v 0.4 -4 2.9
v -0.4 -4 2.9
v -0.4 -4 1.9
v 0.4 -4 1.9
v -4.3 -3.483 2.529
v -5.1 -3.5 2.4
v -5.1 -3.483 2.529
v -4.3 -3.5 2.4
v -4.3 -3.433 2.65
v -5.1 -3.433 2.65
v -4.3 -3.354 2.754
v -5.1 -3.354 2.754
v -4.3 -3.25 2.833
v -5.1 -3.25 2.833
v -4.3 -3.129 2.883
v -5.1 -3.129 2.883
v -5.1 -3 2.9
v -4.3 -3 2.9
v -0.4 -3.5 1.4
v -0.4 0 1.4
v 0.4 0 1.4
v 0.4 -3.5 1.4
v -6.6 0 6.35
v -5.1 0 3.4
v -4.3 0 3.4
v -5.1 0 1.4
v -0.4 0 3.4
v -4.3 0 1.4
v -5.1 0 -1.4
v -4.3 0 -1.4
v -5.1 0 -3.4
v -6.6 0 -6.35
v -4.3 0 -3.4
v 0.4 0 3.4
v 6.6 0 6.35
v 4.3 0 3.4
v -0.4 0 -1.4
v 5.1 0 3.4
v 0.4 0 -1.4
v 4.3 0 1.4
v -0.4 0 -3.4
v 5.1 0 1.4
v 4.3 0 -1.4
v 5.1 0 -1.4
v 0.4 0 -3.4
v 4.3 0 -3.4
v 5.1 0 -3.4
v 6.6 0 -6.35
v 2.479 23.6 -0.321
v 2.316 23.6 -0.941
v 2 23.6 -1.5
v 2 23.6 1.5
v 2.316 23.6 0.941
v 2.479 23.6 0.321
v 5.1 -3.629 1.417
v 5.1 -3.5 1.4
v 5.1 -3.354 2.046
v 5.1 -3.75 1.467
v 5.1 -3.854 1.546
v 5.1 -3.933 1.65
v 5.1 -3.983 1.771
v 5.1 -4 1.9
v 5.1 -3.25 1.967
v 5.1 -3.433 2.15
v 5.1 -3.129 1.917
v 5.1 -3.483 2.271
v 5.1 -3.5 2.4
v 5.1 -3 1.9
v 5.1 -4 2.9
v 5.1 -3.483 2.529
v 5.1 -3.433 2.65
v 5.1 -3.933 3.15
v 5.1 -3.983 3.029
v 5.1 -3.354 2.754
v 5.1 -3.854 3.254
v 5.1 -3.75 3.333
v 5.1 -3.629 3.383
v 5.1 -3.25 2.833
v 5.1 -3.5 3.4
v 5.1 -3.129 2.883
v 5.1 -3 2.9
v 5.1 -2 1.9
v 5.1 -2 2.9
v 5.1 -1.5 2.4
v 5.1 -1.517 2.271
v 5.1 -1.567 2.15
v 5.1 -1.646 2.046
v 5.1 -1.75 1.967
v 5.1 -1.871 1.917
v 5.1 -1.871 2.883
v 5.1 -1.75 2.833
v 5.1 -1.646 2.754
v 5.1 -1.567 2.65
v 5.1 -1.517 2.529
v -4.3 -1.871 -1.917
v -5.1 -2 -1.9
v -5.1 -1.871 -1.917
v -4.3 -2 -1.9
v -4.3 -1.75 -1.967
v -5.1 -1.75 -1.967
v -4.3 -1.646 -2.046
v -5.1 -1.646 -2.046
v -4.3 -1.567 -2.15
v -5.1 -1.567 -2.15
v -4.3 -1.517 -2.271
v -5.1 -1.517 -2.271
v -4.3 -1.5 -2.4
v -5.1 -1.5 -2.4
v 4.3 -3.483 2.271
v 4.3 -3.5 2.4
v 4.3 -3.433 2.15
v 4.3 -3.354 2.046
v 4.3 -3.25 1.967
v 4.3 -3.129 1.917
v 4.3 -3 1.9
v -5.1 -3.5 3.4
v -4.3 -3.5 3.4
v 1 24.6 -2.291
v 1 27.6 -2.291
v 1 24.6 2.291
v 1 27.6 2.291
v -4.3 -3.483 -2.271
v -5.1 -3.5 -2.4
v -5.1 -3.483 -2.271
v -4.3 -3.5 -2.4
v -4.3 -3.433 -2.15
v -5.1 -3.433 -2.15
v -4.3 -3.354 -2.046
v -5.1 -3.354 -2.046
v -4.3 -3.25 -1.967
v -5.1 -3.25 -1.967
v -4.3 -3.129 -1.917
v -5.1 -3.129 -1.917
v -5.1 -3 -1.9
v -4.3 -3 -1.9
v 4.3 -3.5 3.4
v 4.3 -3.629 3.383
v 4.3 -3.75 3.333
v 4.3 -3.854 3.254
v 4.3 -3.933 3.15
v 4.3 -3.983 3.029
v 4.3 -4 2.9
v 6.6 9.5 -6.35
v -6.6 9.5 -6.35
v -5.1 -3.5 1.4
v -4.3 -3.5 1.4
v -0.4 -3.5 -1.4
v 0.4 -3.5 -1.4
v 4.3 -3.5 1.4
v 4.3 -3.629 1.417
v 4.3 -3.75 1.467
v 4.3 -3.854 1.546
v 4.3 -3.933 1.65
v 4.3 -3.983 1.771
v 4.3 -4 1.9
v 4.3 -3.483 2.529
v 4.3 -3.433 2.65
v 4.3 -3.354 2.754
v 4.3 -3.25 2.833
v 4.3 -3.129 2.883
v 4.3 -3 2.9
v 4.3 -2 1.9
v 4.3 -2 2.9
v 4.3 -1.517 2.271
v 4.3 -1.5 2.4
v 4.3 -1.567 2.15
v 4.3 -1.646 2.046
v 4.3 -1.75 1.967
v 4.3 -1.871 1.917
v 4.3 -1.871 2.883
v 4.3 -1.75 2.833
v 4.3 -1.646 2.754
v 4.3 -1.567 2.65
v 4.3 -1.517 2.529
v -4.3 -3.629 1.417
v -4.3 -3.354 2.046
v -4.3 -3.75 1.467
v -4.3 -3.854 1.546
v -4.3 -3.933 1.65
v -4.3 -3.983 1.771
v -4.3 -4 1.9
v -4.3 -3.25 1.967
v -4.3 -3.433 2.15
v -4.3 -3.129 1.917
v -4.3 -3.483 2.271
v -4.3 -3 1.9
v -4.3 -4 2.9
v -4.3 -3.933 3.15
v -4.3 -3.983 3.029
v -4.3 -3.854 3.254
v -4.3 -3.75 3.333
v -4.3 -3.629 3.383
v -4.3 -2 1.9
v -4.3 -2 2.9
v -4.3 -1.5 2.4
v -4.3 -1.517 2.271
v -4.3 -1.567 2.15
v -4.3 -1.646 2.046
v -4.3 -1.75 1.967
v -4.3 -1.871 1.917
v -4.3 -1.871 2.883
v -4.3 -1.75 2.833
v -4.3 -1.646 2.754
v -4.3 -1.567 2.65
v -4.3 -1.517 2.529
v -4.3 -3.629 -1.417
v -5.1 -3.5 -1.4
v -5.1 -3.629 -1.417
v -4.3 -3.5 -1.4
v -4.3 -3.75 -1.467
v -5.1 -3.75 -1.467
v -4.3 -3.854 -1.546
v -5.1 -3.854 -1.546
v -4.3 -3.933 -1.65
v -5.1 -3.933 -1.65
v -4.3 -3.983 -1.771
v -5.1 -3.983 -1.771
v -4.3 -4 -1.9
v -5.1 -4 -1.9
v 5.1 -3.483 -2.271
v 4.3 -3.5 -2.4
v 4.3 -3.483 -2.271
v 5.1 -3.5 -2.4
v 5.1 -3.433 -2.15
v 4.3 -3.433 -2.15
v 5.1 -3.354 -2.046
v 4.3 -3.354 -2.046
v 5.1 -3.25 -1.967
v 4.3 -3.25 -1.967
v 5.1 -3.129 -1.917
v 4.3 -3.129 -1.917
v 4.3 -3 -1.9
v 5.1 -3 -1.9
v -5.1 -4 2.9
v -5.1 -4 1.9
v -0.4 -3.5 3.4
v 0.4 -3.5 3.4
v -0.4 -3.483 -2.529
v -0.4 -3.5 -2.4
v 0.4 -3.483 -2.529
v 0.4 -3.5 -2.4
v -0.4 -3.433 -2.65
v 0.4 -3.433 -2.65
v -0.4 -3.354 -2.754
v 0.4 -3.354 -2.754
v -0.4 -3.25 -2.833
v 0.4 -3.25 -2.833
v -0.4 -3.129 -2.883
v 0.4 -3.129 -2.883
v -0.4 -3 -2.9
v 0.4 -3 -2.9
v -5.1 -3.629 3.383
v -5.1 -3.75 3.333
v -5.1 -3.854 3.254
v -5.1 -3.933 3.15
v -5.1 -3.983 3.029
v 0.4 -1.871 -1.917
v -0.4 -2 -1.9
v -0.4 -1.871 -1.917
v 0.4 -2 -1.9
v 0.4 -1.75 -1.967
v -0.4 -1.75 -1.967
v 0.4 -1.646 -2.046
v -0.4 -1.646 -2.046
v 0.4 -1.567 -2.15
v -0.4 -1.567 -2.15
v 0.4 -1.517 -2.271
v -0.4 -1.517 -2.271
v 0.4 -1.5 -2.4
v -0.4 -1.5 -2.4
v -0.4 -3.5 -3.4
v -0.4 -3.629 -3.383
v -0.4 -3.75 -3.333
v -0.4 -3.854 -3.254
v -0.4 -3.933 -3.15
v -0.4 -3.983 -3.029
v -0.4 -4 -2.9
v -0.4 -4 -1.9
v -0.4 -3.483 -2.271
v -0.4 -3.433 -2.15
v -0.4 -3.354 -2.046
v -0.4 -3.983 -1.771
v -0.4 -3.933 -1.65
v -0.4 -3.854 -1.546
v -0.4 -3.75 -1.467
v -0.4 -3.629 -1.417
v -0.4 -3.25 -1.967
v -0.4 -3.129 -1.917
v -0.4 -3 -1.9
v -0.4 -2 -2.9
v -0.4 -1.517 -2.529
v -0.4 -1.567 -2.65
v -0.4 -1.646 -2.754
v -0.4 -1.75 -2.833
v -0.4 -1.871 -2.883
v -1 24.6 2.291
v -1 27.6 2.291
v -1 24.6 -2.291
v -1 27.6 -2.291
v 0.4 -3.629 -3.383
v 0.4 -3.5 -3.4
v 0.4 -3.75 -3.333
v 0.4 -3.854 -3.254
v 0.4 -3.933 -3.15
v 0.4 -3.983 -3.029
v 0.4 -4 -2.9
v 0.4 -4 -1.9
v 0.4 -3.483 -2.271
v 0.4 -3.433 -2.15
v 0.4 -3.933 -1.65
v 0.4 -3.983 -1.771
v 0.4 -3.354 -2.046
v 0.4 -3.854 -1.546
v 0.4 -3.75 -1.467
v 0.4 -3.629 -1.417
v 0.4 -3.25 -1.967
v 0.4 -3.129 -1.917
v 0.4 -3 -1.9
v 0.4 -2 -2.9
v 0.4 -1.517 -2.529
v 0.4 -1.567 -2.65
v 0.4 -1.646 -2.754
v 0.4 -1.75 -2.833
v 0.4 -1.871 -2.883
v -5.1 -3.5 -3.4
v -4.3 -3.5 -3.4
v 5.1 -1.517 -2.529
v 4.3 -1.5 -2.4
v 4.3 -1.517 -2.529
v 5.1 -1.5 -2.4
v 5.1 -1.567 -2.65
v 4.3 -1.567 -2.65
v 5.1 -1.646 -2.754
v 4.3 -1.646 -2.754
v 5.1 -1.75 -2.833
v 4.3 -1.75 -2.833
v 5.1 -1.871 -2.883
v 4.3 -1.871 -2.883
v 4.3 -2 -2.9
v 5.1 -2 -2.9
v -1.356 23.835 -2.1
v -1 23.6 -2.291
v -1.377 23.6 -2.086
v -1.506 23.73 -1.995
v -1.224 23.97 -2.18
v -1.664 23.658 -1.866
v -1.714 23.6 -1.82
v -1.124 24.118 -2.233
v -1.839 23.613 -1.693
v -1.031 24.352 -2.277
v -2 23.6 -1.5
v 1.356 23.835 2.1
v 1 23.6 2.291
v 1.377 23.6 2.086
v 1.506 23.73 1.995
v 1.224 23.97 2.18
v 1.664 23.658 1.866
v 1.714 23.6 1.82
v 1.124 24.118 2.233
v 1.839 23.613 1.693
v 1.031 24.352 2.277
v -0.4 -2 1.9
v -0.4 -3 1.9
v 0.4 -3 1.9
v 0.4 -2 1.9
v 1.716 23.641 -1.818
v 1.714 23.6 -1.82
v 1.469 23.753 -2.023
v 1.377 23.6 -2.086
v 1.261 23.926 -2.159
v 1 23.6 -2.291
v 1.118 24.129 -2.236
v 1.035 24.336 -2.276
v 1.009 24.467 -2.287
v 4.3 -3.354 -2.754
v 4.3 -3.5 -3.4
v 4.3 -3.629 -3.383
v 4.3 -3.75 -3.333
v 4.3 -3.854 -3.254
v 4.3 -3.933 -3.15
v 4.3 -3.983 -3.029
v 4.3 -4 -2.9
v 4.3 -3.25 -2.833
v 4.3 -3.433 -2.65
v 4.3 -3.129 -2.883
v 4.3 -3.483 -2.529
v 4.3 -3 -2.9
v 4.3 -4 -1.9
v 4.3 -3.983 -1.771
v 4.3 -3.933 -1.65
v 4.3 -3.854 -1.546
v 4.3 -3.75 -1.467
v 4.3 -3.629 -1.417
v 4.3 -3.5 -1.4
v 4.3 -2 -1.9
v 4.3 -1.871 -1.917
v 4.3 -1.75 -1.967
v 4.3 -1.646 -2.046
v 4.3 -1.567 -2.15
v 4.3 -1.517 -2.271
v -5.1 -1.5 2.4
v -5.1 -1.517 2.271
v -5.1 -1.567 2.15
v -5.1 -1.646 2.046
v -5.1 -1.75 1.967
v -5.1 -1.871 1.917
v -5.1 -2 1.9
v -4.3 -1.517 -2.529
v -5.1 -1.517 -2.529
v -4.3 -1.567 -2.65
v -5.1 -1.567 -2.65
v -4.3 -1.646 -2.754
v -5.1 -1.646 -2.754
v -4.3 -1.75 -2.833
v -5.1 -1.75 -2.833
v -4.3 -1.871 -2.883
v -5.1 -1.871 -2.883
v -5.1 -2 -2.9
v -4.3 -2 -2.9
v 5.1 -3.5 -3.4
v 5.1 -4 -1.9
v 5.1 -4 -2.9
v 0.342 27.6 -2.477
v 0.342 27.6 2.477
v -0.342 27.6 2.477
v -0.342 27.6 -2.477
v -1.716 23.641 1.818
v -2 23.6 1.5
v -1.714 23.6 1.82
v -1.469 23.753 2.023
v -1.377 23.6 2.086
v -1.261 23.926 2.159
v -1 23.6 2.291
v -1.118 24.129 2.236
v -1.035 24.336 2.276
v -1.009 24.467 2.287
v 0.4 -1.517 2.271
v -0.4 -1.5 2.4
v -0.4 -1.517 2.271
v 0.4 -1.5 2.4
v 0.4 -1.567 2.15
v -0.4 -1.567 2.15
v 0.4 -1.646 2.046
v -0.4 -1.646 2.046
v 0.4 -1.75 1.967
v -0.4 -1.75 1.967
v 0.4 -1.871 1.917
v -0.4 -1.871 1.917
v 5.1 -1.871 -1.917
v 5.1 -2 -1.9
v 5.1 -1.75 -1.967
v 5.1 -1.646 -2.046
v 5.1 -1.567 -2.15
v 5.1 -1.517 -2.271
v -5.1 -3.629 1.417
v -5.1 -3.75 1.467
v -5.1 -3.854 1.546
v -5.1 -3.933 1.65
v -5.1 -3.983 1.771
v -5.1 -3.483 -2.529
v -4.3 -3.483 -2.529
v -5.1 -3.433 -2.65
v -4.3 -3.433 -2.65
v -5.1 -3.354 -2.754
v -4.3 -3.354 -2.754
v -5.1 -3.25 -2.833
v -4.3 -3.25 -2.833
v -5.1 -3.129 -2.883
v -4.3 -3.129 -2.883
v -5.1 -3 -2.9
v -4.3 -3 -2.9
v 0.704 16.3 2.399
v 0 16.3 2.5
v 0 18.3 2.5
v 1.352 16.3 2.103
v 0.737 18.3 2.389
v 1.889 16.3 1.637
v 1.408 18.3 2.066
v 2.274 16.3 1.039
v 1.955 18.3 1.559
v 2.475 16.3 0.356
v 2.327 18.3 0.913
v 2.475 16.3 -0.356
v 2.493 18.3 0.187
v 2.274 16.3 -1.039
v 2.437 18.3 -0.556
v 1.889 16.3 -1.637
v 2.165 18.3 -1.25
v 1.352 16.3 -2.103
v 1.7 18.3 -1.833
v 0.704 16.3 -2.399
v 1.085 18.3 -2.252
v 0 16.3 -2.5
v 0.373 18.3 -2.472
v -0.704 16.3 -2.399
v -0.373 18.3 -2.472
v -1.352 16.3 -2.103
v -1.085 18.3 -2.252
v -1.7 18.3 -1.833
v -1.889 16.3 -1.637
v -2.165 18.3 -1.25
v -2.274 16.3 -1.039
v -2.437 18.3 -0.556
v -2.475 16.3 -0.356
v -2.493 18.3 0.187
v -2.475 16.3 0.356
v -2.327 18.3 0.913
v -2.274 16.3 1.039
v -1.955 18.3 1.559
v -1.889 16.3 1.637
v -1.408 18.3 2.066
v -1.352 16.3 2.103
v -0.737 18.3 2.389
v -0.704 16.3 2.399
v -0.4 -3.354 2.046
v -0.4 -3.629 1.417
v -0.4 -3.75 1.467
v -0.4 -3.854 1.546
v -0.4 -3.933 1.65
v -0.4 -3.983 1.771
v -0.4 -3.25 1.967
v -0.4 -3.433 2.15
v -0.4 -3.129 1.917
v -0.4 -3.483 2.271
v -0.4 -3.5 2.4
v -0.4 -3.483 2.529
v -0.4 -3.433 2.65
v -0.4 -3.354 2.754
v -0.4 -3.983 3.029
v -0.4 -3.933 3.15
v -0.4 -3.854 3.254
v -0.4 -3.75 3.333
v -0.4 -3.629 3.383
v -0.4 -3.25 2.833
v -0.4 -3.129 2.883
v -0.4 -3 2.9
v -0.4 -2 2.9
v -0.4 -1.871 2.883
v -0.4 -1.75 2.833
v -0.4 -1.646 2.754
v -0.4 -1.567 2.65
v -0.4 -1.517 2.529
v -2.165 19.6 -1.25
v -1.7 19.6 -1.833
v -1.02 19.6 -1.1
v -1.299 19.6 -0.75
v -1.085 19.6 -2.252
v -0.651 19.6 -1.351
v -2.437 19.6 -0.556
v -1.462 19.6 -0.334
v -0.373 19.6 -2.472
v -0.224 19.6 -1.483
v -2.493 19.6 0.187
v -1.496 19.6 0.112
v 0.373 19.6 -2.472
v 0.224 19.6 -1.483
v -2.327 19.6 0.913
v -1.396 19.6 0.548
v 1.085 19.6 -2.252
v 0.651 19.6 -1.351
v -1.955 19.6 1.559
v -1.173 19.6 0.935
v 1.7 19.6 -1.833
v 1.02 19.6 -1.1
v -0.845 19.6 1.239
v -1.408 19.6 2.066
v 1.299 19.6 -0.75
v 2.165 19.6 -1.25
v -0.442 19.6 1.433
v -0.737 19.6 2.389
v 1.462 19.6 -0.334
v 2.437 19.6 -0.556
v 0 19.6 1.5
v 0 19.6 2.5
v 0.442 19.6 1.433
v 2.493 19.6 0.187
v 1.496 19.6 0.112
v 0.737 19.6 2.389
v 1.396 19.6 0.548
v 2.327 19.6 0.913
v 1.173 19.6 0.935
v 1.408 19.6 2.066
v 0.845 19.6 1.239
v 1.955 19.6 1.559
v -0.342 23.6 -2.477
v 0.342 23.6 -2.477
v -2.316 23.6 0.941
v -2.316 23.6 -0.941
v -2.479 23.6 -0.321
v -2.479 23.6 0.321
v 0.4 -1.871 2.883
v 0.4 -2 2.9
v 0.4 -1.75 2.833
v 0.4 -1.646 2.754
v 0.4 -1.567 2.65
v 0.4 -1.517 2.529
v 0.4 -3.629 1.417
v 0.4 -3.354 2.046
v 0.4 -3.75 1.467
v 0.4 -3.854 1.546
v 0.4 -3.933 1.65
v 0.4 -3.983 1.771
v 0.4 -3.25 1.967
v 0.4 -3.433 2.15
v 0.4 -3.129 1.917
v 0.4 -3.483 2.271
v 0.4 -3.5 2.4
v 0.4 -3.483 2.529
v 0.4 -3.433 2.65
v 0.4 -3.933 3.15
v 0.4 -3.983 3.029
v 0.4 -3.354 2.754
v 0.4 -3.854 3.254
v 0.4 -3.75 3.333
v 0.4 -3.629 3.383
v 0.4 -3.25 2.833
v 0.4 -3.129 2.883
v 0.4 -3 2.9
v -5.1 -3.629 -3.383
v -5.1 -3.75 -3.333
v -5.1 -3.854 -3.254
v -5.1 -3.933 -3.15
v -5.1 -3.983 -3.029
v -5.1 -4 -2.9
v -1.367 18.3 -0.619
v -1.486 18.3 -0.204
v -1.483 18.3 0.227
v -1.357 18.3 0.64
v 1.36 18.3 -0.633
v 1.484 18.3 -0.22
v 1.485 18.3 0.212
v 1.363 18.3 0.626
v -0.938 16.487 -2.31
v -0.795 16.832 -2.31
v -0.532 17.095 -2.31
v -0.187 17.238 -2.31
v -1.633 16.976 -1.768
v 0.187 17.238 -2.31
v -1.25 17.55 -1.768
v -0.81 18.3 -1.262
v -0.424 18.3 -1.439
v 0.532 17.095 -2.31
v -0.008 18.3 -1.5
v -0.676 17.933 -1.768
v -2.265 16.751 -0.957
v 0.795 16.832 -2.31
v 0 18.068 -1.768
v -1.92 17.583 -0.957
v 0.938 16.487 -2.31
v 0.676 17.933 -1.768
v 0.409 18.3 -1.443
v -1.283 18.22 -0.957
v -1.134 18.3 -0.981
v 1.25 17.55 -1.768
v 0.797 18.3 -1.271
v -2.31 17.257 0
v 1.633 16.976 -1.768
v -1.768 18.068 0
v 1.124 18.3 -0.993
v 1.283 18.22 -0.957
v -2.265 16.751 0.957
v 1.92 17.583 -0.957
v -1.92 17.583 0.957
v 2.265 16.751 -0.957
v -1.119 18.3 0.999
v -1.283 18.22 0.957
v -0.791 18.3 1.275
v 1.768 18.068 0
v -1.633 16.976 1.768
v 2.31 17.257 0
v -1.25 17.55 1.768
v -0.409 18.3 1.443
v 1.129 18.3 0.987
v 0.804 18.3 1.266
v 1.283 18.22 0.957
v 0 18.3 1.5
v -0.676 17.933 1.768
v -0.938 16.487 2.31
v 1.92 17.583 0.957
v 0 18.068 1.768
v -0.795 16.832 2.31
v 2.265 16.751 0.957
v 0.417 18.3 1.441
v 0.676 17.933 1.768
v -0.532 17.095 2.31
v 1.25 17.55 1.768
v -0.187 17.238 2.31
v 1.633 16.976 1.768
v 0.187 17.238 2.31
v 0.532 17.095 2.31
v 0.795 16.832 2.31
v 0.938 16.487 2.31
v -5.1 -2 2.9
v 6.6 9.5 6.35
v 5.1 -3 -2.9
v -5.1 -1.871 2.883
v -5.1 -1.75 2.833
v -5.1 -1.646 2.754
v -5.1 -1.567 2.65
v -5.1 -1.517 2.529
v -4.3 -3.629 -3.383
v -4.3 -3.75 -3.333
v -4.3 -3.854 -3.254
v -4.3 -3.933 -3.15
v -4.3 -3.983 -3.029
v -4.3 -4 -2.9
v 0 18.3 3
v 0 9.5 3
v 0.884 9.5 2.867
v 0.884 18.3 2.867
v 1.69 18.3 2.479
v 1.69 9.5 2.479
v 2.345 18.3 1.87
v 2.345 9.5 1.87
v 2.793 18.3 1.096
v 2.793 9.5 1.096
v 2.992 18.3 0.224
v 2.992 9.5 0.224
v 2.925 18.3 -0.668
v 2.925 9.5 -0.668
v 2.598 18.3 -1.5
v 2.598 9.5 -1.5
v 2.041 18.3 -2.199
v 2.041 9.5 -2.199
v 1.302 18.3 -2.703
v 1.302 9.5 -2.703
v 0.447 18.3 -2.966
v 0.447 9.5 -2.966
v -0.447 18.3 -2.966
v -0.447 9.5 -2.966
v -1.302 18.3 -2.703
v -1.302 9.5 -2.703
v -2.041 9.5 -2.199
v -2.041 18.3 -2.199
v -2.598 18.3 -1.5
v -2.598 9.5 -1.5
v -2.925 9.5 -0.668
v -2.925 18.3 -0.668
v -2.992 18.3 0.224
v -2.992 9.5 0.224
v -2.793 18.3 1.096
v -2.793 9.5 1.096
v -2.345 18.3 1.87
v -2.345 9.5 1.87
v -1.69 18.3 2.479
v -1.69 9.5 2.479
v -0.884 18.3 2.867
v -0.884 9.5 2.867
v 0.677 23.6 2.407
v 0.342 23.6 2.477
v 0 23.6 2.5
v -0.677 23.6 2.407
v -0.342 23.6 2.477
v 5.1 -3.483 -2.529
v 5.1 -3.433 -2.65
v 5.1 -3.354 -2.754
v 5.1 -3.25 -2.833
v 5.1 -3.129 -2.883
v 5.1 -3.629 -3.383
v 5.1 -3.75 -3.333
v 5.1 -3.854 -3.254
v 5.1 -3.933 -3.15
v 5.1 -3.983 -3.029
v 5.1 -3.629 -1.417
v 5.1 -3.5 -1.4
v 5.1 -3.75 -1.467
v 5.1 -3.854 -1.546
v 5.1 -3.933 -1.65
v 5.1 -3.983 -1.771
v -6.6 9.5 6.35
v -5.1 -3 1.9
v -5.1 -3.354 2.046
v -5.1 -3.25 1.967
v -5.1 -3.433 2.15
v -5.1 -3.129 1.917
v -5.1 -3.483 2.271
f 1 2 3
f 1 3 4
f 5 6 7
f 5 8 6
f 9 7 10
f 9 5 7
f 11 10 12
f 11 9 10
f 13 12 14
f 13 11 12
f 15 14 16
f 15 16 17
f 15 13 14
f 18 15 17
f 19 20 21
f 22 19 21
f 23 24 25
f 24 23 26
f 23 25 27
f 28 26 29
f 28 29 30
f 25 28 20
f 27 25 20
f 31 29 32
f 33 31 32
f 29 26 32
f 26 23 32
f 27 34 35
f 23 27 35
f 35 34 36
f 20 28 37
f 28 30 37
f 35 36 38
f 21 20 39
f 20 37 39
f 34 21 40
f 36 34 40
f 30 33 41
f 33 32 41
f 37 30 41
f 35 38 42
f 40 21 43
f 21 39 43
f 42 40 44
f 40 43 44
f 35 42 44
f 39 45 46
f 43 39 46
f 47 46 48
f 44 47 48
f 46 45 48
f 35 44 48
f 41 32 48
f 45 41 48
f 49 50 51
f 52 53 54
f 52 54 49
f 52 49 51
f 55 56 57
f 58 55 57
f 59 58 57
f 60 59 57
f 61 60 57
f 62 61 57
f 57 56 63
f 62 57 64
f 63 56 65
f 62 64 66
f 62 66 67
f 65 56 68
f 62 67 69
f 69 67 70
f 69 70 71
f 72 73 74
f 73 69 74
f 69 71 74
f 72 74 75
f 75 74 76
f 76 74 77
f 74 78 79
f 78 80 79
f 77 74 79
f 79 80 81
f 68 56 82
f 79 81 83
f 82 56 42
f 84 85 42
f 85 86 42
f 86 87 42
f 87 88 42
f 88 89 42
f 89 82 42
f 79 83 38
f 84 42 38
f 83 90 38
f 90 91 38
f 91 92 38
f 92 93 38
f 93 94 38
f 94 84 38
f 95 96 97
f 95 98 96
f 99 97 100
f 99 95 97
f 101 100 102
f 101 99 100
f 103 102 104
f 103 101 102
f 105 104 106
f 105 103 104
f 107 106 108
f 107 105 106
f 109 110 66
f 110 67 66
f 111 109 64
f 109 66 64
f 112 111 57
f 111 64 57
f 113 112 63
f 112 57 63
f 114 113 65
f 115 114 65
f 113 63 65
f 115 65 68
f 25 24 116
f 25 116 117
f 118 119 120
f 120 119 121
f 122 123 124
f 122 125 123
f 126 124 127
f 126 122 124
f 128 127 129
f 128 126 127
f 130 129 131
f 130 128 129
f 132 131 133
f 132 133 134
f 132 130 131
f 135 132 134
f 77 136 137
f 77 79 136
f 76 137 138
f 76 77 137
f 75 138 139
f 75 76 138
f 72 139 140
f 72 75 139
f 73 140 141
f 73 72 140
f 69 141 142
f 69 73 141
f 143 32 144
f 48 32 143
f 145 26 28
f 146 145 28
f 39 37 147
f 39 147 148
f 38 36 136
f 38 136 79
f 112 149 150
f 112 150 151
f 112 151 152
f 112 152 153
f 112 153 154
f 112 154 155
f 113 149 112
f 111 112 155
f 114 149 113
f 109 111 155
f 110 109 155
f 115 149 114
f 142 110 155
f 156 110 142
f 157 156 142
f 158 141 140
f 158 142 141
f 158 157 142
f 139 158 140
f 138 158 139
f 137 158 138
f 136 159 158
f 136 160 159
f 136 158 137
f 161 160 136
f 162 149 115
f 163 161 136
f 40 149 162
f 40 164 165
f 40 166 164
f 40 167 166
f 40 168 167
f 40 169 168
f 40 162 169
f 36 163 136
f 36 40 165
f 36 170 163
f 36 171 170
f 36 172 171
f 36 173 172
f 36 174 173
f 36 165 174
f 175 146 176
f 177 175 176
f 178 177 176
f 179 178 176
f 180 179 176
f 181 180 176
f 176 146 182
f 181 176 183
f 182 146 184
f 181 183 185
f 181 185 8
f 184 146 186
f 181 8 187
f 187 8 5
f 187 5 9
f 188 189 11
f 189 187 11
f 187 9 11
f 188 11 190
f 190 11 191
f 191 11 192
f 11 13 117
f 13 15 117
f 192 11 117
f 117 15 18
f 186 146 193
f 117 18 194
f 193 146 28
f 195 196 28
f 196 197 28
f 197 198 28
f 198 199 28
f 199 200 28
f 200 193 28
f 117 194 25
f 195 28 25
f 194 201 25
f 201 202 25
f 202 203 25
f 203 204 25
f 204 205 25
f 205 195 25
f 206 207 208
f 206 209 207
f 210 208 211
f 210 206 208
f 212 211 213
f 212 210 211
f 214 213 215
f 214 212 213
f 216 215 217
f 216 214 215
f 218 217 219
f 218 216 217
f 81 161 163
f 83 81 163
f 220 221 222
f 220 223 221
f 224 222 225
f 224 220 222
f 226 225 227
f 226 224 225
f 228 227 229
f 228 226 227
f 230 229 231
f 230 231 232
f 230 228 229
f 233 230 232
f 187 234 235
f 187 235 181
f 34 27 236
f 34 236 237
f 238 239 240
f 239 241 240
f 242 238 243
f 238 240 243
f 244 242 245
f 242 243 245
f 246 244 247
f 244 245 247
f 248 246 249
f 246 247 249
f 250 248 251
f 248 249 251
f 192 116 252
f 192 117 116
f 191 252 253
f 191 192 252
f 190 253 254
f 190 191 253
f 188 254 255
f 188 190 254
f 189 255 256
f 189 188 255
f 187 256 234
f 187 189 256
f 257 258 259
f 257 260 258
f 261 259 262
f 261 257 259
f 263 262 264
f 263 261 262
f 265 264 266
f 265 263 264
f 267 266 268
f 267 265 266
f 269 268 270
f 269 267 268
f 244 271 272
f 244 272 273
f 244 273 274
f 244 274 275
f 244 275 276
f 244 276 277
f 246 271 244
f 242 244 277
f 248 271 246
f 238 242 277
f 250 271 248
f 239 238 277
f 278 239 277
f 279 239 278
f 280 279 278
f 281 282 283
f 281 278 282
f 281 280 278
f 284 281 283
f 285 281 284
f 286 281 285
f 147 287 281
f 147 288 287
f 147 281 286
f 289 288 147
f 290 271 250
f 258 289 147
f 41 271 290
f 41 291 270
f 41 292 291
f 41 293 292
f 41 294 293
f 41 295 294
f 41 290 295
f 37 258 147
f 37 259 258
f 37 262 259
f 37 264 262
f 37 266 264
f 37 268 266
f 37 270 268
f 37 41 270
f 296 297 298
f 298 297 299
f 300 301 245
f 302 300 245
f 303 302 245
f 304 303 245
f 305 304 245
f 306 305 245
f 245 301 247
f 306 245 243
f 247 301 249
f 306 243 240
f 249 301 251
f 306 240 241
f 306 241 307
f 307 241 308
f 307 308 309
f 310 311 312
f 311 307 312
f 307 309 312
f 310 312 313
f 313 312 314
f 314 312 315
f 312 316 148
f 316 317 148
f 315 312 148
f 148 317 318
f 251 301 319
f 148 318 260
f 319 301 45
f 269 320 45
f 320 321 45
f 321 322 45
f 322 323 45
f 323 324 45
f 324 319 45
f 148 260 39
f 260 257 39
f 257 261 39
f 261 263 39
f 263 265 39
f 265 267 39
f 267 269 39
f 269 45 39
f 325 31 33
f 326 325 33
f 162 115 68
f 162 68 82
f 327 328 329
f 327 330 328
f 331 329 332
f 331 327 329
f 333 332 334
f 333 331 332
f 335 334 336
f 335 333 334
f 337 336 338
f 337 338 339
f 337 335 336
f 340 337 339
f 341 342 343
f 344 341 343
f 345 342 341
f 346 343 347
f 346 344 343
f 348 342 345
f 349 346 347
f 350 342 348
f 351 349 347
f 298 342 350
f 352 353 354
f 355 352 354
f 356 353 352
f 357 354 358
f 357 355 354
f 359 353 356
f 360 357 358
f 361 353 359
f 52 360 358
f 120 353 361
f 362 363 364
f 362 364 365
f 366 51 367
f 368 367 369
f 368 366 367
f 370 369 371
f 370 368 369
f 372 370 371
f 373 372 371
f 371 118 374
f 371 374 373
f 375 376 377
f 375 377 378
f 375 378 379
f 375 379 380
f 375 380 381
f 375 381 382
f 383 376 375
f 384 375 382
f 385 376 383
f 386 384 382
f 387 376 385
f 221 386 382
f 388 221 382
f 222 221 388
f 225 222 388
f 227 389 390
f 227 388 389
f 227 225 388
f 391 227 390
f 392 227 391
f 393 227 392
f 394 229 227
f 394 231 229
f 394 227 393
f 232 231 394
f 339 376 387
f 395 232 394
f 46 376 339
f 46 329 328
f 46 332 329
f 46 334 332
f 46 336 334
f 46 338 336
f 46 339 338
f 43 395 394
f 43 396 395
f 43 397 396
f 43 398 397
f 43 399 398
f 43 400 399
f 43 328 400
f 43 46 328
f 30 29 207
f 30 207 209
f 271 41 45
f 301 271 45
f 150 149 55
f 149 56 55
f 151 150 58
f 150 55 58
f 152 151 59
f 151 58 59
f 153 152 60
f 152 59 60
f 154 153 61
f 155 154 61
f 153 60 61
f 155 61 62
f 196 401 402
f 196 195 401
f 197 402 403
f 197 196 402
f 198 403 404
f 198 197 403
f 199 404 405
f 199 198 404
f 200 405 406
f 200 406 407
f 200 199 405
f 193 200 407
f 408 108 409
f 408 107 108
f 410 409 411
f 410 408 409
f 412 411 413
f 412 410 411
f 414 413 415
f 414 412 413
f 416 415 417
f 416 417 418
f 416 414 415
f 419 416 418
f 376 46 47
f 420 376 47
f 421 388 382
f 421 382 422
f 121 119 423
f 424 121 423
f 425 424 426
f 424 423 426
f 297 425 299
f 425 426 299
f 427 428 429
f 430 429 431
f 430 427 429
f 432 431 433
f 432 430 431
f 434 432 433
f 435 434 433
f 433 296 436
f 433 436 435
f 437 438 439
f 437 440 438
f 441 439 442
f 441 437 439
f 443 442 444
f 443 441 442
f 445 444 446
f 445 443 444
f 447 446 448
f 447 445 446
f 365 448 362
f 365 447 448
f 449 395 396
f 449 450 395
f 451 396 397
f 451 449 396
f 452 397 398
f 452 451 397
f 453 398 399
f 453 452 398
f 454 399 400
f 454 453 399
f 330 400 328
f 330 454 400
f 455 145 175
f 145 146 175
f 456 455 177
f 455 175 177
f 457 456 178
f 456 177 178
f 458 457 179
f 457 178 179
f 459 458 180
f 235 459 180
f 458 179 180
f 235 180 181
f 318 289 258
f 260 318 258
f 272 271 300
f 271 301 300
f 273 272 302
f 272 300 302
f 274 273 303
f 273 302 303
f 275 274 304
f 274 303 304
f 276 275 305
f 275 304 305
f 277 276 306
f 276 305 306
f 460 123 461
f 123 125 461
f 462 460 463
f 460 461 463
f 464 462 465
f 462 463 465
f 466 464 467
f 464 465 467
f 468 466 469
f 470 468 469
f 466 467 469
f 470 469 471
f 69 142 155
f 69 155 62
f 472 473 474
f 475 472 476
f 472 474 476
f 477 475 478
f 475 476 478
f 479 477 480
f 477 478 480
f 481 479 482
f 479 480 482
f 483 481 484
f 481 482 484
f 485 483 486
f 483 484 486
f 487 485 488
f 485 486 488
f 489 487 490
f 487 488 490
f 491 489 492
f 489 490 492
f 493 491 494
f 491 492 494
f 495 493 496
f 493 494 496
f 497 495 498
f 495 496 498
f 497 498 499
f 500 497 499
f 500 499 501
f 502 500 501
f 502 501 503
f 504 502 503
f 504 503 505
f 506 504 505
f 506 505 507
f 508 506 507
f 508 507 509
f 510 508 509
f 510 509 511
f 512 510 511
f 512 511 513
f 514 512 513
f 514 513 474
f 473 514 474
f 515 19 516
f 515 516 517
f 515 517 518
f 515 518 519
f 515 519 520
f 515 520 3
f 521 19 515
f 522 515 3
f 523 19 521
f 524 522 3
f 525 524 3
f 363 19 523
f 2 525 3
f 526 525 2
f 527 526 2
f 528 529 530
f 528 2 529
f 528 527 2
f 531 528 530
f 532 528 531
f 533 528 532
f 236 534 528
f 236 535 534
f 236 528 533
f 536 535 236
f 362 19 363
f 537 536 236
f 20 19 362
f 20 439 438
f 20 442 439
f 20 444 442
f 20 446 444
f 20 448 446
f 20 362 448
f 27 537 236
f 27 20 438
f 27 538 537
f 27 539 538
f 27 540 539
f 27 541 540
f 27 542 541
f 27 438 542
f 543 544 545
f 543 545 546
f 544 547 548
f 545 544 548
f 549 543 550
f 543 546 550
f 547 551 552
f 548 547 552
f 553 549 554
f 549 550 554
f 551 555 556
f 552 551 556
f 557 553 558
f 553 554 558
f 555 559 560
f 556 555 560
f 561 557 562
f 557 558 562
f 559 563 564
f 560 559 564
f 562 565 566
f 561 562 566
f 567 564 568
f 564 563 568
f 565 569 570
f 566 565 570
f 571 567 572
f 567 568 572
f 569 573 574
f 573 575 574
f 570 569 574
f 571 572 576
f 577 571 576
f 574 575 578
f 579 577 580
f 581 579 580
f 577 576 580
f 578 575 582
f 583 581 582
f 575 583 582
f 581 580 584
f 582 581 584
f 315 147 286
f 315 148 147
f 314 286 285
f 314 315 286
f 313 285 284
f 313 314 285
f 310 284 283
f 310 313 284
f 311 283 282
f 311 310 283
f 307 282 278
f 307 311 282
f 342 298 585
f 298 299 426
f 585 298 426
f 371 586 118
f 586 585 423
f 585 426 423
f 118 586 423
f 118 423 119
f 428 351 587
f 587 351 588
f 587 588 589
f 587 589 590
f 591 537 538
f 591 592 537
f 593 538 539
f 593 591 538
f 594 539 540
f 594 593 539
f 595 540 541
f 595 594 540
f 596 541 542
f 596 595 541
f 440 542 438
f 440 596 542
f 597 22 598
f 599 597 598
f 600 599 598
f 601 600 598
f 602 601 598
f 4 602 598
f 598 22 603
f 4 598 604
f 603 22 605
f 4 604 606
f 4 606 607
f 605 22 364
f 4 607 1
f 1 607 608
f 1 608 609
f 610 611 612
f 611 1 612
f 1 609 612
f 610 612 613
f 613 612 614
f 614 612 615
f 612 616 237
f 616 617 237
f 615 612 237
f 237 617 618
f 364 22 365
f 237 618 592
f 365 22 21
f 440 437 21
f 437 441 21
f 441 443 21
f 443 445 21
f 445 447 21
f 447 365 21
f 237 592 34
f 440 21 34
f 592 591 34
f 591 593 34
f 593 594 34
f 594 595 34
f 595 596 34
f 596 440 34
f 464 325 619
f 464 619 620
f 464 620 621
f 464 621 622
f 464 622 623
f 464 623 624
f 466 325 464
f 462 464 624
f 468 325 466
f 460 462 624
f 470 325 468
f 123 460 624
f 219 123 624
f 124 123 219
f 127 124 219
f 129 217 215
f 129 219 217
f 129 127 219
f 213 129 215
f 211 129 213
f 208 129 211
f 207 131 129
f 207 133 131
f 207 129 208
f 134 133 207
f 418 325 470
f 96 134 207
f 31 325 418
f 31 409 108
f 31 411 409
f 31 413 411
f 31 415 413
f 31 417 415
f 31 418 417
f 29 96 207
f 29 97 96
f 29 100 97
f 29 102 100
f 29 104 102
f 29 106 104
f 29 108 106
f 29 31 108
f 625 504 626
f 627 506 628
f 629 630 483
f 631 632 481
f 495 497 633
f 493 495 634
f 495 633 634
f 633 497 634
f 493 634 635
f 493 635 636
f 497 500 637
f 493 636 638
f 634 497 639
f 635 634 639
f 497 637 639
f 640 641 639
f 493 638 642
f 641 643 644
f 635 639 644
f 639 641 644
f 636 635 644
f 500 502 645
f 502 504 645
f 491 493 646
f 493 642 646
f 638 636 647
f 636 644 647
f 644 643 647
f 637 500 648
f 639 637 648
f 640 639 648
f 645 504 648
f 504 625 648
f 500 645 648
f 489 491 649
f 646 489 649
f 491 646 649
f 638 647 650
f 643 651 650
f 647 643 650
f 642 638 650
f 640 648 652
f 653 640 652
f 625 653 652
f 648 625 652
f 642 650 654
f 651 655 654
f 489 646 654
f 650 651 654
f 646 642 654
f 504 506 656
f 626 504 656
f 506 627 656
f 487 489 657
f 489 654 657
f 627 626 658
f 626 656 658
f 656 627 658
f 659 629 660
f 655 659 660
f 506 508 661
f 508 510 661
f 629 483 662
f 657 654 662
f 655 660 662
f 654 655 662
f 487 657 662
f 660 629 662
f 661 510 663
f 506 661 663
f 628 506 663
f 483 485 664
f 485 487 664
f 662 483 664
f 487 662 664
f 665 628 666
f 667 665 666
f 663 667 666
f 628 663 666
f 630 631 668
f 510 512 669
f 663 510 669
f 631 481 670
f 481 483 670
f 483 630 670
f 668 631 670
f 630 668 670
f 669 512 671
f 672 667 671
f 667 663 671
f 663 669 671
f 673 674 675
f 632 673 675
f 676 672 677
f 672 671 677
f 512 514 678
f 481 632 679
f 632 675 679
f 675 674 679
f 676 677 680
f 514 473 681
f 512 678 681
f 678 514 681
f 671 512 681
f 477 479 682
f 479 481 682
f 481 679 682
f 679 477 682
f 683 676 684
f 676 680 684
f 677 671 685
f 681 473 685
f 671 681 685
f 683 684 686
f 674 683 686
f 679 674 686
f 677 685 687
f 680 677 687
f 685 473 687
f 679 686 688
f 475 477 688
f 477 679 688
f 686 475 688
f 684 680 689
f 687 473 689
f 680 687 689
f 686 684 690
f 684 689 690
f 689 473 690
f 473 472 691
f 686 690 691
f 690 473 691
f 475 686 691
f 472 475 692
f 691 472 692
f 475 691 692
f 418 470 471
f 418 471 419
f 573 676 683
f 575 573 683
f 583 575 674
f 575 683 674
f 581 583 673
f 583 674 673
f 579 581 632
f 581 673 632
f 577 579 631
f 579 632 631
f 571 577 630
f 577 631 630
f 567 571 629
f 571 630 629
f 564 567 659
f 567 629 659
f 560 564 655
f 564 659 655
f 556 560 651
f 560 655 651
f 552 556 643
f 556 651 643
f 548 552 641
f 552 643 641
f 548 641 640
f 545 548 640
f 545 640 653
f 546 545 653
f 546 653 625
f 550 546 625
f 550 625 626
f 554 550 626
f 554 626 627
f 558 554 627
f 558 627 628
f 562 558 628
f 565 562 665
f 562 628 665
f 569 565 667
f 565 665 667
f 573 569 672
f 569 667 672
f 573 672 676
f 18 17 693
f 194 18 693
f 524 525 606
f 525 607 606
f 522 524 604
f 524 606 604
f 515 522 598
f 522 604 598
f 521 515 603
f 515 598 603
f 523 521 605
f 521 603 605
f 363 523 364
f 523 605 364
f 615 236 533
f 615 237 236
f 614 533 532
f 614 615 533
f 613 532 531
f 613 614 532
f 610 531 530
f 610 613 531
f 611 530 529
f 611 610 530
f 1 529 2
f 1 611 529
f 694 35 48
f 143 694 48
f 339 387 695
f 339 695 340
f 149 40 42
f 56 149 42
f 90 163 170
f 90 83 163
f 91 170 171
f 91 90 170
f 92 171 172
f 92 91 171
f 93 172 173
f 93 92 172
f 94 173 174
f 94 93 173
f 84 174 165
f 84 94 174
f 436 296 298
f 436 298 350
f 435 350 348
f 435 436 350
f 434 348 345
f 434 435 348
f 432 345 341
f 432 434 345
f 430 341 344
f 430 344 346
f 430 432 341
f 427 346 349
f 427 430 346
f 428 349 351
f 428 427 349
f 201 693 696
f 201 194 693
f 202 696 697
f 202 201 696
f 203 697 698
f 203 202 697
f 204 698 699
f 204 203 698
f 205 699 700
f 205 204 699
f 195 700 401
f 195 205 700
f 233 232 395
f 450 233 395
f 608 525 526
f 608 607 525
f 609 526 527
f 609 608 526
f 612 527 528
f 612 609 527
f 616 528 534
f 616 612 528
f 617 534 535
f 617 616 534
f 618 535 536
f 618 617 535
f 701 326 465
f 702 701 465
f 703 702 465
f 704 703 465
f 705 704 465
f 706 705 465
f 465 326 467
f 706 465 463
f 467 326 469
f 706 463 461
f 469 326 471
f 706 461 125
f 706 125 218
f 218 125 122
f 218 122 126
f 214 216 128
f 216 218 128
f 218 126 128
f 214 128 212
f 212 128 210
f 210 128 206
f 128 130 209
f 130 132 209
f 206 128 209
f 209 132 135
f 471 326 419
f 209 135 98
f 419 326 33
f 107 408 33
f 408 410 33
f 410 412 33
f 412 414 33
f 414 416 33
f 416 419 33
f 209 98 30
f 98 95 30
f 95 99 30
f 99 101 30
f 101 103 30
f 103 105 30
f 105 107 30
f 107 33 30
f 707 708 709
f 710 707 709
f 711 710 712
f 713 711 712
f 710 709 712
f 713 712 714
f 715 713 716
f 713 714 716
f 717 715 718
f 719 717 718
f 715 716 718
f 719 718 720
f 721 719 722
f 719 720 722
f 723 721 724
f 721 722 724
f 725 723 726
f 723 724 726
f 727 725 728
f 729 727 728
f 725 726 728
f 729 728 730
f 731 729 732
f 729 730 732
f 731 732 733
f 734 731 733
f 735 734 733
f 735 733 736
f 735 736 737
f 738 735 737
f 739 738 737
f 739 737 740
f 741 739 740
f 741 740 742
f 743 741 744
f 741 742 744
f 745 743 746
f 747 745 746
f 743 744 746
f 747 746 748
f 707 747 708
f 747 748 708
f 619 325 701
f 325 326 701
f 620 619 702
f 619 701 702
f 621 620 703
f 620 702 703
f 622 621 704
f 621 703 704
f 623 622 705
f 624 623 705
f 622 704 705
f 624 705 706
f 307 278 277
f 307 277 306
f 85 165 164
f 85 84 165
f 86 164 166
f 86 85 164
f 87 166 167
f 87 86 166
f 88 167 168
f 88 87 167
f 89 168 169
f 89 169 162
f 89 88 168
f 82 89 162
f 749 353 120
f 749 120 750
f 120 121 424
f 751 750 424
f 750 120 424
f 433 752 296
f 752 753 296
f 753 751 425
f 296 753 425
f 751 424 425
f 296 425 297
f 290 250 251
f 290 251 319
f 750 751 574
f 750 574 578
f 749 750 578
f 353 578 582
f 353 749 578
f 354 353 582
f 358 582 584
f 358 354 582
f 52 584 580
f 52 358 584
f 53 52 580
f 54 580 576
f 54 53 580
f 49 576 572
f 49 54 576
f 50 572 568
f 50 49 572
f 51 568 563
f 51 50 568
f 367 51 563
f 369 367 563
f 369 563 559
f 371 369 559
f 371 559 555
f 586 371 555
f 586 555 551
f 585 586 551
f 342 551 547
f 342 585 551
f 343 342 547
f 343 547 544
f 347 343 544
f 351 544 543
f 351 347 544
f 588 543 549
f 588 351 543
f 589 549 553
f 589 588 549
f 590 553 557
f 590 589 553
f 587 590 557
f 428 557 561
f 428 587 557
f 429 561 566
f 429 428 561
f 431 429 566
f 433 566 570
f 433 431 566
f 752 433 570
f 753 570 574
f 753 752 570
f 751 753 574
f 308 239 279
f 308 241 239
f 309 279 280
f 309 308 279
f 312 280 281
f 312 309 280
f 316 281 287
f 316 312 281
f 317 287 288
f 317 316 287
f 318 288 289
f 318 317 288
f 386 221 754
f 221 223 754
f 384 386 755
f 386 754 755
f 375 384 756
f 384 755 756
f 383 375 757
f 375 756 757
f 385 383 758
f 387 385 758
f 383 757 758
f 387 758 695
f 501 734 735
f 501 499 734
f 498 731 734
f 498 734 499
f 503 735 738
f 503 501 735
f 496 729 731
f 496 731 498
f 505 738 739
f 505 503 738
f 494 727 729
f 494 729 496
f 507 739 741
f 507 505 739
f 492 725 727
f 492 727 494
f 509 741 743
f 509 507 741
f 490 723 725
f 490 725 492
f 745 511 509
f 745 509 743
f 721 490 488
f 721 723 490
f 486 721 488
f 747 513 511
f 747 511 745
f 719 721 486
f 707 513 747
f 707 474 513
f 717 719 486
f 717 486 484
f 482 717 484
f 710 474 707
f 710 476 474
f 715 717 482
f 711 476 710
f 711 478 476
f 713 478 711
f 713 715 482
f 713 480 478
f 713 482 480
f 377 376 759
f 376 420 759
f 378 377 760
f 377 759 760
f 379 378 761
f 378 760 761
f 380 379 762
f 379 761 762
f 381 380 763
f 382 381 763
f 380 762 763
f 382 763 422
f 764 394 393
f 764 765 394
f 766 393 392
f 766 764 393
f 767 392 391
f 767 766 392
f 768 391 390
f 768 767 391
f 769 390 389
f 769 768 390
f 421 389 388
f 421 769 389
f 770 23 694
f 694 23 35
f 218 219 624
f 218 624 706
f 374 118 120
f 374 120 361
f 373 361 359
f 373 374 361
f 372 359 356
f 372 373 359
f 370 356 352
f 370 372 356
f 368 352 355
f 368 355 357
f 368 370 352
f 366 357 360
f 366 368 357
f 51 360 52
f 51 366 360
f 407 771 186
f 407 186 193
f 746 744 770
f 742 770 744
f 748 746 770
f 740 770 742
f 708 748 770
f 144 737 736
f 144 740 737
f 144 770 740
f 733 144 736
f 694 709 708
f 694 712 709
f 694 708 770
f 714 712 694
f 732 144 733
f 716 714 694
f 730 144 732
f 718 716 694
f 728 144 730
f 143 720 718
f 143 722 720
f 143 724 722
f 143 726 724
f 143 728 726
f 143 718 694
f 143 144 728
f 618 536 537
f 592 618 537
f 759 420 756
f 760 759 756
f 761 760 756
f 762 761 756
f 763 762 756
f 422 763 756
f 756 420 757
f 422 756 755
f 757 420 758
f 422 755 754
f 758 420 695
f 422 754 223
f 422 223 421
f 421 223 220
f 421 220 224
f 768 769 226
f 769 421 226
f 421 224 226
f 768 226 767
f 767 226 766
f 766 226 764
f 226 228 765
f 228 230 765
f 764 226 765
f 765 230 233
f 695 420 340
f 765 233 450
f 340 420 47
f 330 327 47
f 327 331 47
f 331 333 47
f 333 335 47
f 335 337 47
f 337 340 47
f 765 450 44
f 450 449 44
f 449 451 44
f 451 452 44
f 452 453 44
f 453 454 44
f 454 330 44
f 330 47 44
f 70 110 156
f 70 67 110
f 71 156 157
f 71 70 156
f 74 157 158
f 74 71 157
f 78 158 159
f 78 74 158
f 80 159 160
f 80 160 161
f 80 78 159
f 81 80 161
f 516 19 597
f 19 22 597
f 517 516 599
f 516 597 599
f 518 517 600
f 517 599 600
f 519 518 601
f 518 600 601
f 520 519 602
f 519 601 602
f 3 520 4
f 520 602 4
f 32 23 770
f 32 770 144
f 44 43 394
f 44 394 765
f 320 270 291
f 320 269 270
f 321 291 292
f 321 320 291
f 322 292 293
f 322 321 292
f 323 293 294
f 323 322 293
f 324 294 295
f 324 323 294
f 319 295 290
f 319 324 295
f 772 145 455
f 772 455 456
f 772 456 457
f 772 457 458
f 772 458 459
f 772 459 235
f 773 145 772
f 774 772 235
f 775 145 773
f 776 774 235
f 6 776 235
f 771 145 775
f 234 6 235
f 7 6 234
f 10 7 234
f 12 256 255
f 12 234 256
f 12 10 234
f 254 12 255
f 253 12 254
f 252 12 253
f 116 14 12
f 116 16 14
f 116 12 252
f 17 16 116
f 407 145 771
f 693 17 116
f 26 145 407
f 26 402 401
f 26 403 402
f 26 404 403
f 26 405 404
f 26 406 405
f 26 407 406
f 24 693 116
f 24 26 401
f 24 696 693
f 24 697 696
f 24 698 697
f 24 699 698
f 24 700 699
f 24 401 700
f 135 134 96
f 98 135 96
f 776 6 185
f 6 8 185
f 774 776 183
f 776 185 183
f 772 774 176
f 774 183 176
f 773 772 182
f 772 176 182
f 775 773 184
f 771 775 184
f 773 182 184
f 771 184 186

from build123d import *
from build123d.topology import SkipClean

# Parameters (mm, degrees)
SKETCH1_W           = 13.2
SKETCH1_H           = 12.7
BOSS_EXTRUDE1_DEPTH = 9.5
SKETCH2_R           = 3
BOSS_EXTRUDE2_DEPTH = 8.8
SKETCH4_R           = 2.5
CUT_EXTRUDE1_DEPTH  = 2
SKETCH5_R           = 1.5
BOSS_EXTRUDE3_DEPTH = 5
REVOLVE2_ANGLE      = 180
FILLET1_R           = 1
SKETCH6_W           = 0.8
SKETCH6_H           = 2
BOSS_EXTRUDE4_DEPTH = 4
SKETCH7_W           = 1
SKETCH7_H           = 2
CUT_EXTRUDE2_DEPTH  = 26.117773
FILLET2_R           = 0.5
BOSS_EXTRUDE5_START = 5.3
SKETCH8_R           = 2.5
BOSS_EXTRUDE5_DEPTH = 4
BOSS_EXTRUDE6_START = 4
BOSS_EXTRUDE6_DEPTH = 4
FILLET3_R           = 1


# Some blends are built 0.0001 mm under size
with BuildPart() as part:
    # Sketch1 → Boss-Extrude1 (new body)
    with BuildSketch(Plane(origin=(0, 0, 0), x_dir=(1, 0, 0), z_dir=(0, 1, 0))):
        Rectangle(SKETCH1_W, SKETCH1_H)
    extrude(amount=BOSS_EXTRUDE1_DEPTH)

    # Sketch2 → Boss-Extrude2 (add)
    with BuildSketch(Plane(origin=(0, 9.5, 0), x_dir=(1, 0, 0), z_dir=(0, 1, 0))):
        with Locations(Location((0, 0, 0), (0, 0, 270))):
            Circle(SKETCH2_R)
    extrude(amount=BOSS_EXTRUDE2_DEPTH)

    # Sketch4 → Cut-Extrude1 (cut)
    with BuildSketch(Plane(origin=(0, 18.3, 0), x_dir=(1, 0, 0), z_dir=(0, 1, 0))):
        with Locations(Location((0, 0, 0), (0, 0, 270))):
            Circle(SKETCH4_R)
    extrude(amount=-CUT_EXTRUDE1_DEPTH, mode=Mode.SUBTRACT)

    # Sketch5 → Boss-Extrude3 (add)
    with BuildSketch(Plane(origin=(0, 16.3, 0), x_dir=(1, 0, 0), z_dir=(0, 1, 0))):
        with Locations(Location((0, 0, 0), (0, 0, 270))):
            Circle(SKETCH5_R)
    extrude(amount=BOSS_EXTRUDE3_DEPTH)

    # Sketch3 → Revolve2 (revolve)
    with BuildSketch(Plane(origin=(0, 16.3, 0), x_dir=(1, 0, 0), z_dir=(0, 1, 0))):
        with BuildLine():
            Line((0, -2.5), (0, 2.5))
            ThreePointArc((0, 2.5), (-2.5, 0), (0, -2.5))
        make_face()
    revolve(axis=Axis((0, 16.3, 3), (0, 0, -1)), revolution_arc=REVOLVE2_ANGLE)

    # Fillet1
    fillet1_edges = [part.edges().sort_by_distance(p)[0] for p in [
        (0, 21.3, -1.5),
    ]]
    fillet(fillet1_edges, radius=FILLET1_R)

    # Sketch6 → Boss-Extrude4 (add)
    with BuildSketch(Plane.XZ):
        with Locations((-4.7, 2.4)):
            Rectangle(SKETCH6_W, SKETCH6_H)
        with Locations((-4.7, -2.4)):
            Rectangle(SKETCH6_W, SKETCH6_H)
        with Locations((0, -2.4)):
            Rectangle(SKETCH6_W, SKETCH6_H)
        with Locations((0, 2.4)):
            Rectangle(SKETCH6_W, SKETCH6_H)
        with Locations((4.7, 2.4)):
            Rectangle(SKETCH6_W, SKETCH6_H)
        with Locations((4.7, -2.4)):
            Rectangle(SKETCH6_W, SKETCH6_H)
    extrude(amount=BOSS_EXTRUDE4_DEPTH)

    # Sketch7 → Cut-Extrude2 (cut, through all)
    with BuildSketch(Plane.ZY.offset(5.1)):
        with Locations((-2.4, -2.5)):
            Rectangle(SKETCH7_W, SKETCH7_H)
        with Locations((2.4, -2.5)):
            Rectangle(SKETCH7_W, SKETCH7_H)
    extrude(amount=-CUT_EXTRUDE2_DEPTH, mode=Mode.SUBTRACT)

    # Fillet2
    fillet2_edges = [part.edges().sort_by_distance(p)[0] for p in [
        (4.7, -3.5, 2.9),
        (4.7, -3.5, 1.9),
        (4.7, -3.5, -1.9),
        (4.7, -3.5, -2.9),
        (4.7, -1.5, -1.9),
        (4.7, -1.5, 2.9),
        (4.7, -1.5, 1.9),
        (4.7, -1.5, -2.9),
        (0, -1.5, 1.9),
        (0, -1.5, 2.9),
        (0, -3.5, 2.9),
        (0, -3.5, 1.9),
        (0, -3.5, -1.9),
        (0, -3.5, -2.9),
        (0, -1.5, -2.9),
        (0, -1.5, -1.9),
        (-4.7, -3.5, 2.9),
        (-4.7, -1.5, 2.9),
        (-4.7, -3.5, 1.9),
        (-4.7, -1.5, 1.9),
        (-4.7, -1.5, -1.9),
        (-4.7, -1.5, -2.9),
        (-4.7, -3.5, -1.9),
        (-4.7, -3.5, -2.9),
        (0, -4, -1.4),
        (0, -4, -3.4),
        (4.7, -4, -1.4),
        (4.7, -4, -3.4),
        (4.7, -4, 1.4),
        (4.7, -4, 3.4),
        (0, -4, 3.4),
        (0, -4, 1.4),
        (-4.7, -4, 3.4),
        (-4.7, -4, 1.4),
        (-4.7, -4, -1.4),
        (-4.7, -4, -3.4),
    ]]
    fillet(fillet2_edges, radius=FILLET2_R - 0.0001)  # a hair under: the kernel refuses the full size

    # Sketch8 → Boss-Extrude5 (add)
    with BuildSketch(Plane(origin=(0, 18.3, 0), x_dir=(1, 0, 0), z_dir=(0, 1, 0)).offset(BOSS_EXTRUDE5_START)):
        with Locations(Location((0, 0, 0), (0, 0, 270))):
            Circle(SKETCH8_R)
    extrude(amount=-BOSS_EXTRUDE5_DEPTH)

    # Sketch9 → Boss-Extrude6 (add)
    with SkipClean():  # the faces are left unmerged after this step: merging them gives an invalid solid
        with BuildSketch(Plane(origin=(0, 23.6, 0), x_dir=(1, 0, 0), z_dir=(0, 1, 0)).offset(BOSS_EXTRUDE6_START)):
            with BuildLine():
                Line((-1, -2.291288), (-1, 2.291288))
                ThreePointArc((-1, 2.291288), (0, 2.5), (1, 2.291288))
                Line((1, 2.291288), (1, -2.291288))
                ThreePointArc((1, -2.291288), (0, -2.5), (-1, -2.291288))
            make_face()
        extrude(amount=-BOSS_EXTRUDE6_DEPTH)

    # Fillet3
    # the kernel refuses this fillet: 1 mm, written as the material it adds along each edge
    with BuildSketch(Plane(origin=(1, 23.6, -4.791288), x_dir=(1, 0, 0), z_dir=(0, 0, 1))) as fillet3_piece_1_section:
        with BuildLine():
            CenterArc((FILLET3_R, FILLET3_R), FILLET3_R, 180, 90)
            Line((0, FILLET3_R), (0, 0))
            Line((0, 0), (FILLET3_R, 0))
        make_face()
    fillet3_piece_1 = extrude(amount=9.582576, mode=Mode.PRIVATE)
    fillet3_piece_1 = fillet3_piece_1 & Plane(origin=(0, 23.834238, 0), x_dir=(0, 0, 1), z_dir=(0, 1, 0)) * Cylinder(2.5, 24, mode=Mode.PRIVATE)
    add(fillet3_piece_1)
    with BuildSketch(Plane(origin=(-1, 23.6, 4.791288), x_dir=(-1, 0, 0), z_dir=(0, 0, -1))) as fillet3_piece_2_section:
        with BuildLine():
            CenterArc((FILLET3_R, FILLET3_R), FILLET3_R, 180, 90)
            Line((0, FILLET3_R), (0, 0))
            Line((0, 0), (FILLET3_R, 0))
        make_face()
    fillet3_piece_2 = extrude(amount=9.582576, mode=Mode.PRIVATE)
    fillet3_piece_2 = fillet3_piece_2 & Plane(origin=(0, 23.834238, 0), x_dir=(0, 0, 1), z_dir=(0, 1, 0)) * Cylinder(2.5, 24, mode=Mode.PRIVATE)
    add(fillet3_piece_2)


solid = part.part
